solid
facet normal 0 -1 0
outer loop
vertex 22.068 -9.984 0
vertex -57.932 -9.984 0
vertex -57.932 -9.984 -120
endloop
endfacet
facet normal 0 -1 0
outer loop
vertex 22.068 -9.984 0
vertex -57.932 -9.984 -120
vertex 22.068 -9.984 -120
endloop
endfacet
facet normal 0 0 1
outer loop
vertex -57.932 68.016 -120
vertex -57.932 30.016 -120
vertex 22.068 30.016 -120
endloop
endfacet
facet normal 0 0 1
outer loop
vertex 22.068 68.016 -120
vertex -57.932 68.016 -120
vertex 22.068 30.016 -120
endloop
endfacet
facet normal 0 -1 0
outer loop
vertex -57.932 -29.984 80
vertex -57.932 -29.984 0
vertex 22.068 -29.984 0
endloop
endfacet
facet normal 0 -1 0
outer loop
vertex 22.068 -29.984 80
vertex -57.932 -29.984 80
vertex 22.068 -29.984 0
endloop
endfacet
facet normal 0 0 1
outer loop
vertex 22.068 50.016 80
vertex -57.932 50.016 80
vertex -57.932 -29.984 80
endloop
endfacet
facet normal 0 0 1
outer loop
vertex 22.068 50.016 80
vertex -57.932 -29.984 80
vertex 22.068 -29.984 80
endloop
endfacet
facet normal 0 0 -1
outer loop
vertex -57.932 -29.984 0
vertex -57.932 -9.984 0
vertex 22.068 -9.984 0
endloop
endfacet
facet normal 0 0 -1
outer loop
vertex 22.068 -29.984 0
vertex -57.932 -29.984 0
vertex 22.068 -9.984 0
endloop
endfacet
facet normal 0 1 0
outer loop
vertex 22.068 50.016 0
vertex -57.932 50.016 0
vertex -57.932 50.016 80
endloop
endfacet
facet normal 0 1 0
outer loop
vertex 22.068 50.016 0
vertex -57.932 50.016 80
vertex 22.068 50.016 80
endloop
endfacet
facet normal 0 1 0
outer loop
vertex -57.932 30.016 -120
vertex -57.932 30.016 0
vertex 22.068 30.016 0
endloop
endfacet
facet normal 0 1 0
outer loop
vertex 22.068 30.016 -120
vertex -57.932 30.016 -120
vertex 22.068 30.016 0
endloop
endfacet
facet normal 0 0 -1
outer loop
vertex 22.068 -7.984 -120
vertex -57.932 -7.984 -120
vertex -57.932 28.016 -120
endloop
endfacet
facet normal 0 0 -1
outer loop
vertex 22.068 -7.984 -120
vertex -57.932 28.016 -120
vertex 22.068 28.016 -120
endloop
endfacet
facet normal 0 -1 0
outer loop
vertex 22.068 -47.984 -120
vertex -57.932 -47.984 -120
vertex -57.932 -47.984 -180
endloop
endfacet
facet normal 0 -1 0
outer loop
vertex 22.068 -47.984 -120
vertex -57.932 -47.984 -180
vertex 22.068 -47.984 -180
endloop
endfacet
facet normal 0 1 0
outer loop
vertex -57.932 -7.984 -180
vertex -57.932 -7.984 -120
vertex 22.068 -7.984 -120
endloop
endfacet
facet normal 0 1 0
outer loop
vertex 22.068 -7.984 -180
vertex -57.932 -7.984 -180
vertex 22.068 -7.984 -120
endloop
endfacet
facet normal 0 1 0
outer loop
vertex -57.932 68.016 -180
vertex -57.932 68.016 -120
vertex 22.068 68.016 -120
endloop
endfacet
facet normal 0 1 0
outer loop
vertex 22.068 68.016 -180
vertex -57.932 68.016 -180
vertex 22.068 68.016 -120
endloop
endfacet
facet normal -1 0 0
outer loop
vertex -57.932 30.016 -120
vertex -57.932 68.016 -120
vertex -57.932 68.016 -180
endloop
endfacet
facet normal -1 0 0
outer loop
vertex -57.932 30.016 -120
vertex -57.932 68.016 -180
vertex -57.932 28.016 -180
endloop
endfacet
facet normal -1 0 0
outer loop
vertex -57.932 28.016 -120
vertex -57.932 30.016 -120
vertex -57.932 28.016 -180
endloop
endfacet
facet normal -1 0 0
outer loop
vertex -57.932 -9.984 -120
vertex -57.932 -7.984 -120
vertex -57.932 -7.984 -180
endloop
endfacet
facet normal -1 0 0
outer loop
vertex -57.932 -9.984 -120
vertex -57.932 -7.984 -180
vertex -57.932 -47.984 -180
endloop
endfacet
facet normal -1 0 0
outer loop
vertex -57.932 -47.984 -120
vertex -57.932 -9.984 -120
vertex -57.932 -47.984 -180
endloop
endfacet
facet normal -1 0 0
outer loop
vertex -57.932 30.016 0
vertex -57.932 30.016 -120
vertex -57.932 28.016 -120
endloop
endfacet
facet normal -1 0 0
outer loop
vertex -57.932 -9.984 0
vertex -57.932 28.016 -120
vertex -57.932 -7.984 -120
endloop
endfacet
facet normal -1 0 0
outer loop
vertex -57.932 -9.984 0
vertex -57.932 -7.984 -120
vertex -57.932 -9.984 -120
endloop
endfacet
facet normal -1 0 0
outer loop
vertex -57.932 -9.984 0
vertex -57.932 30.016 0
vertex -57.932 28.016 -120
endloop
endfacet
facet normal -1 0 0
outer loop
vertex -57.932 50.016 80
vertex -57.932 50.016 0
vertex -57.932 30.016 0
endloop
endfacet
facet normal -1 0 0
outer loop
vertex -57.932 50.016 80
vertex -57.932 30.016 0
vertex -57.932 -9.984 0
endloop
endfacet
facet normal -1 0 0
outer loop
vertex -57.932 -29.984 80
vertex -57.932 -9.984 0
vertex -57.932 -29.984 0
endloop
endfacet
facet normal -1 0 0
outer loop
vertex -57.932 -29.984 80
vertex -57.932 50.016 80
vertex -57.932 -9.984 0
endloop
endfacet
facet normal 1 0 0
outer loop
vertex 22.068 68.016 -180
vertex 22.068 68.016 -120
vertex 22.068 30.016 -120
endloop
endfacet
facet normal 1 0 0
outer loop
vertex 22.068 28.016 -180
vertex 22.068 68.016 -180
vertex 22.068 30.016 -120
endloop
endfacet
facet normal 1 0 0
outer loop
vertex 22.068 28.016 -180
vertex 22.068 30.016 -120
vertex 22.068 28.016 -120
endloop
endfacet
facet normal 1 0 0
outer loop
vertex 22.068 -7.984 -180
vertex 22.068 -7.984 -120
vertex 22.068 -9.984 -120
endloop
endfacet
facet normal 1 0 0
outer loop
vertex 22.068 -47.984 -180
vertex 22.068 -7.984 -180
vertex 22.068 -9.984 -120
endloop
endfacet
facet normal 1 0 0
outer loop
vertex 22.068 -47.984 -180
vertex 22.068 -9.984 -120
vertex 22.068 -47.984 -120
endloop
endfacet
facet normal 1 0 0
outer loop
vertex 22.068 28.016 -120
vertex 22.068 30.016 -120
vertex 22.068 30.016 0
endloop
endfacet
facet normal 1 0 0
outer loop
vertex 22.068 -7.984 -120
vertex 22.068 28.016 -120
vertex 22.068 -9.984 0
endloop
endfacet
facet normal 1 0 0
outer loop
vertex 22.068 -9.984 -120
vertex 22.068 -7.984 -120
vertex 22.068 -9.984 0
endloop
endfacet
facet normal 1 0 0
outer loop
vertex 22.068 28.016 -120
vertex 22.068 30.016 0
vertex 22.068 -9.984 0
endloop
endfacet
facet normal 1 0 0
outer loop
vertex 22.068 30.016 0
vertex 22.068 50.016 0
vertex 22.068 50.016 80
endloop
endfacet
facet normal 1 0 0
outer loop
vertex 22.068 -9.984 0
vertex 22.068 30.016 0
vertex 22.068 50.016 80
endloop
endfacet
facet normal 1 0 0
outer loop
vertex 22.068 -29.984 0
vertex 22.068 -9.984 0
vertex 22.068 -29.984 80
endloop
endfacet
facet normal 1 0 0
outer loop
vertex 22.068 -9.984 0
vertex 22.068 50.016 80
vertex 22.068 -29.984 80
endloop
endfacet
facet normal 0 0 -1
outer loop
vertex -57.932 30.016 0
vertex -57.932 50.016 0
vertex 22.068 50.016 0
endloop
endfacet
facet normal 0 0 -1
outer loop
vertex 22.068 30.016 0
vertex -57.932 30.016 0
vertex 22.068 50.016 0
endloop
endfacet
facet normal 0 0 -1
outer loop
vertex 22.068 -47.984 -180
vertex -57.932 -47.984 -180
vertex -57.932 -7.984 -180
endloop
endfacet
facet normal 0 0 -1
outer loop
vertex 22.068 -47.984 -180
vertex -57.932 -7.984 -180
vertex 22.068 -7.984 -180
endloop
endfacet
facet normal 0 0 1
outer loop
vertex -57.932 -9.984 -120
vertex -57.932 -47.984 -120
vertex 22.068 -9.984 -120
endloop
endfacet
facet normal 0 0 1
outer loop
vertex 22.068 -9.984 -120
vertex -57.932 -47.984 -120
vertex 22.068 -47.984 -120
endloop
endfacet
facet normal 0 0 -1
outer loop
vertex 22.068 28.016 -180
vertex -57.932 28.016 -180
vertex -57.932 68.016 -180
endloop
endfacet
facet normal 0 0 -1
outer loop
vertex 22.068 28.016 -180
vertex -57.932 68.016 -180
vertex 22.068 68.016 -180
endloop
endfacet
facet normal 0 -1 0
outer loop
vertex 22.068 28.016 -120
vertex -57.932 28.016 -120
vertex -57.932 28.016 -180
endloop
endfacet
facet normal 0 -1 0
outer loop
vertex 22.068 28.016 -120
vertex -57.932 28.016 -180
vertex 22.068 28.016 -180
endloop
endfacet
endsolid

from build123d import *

# Parameters (mm, degrees)
F0_W     = 80
F0_H     = 80
F1_DEPTH = 80
F2_W     = 80
F2_H     = 40
F3_DEPTH = 120
F4_W     = 80
F4_H     = 40
F5_DEPTH = 60


with BuildPart() as f1:
    # F0 (on Top) → F1 (new body)
    with BuildSketch(Plane.XY):
        with Locations((-17.931859, 10.016291)):
            Rectangle(F0_W, F0_H)
    extrude(amount=F1_DEPTH)

    # F2 (on face) → F3 (join)
    with BuildSketch(Plane(origin=(0, 0, 0), x_dir=(1, 0, 0), z_dir=(0, 0, -1))):
        with Locations((-17.931859, -10.016291)):
            Rectangle(F2_W, F2_H)
    extrude(amount=F3_DEPTH)

    # F4 (on face) → F5 (join)
    with BuildSketch(Plane(origin=(0, 0, -120), x_dir=(1, 0, 0), z_dir=(0, 0, -1))):
        with Locations((-17.931859, 27.983709)):
            Rectangle(F4_W, F4_H)
        with Locations((-17.931859, -48.016291)):
            Rectangle(F4_W, F4_H)
    extrude(amount=F5_DEPTH)


solid = f1.part
